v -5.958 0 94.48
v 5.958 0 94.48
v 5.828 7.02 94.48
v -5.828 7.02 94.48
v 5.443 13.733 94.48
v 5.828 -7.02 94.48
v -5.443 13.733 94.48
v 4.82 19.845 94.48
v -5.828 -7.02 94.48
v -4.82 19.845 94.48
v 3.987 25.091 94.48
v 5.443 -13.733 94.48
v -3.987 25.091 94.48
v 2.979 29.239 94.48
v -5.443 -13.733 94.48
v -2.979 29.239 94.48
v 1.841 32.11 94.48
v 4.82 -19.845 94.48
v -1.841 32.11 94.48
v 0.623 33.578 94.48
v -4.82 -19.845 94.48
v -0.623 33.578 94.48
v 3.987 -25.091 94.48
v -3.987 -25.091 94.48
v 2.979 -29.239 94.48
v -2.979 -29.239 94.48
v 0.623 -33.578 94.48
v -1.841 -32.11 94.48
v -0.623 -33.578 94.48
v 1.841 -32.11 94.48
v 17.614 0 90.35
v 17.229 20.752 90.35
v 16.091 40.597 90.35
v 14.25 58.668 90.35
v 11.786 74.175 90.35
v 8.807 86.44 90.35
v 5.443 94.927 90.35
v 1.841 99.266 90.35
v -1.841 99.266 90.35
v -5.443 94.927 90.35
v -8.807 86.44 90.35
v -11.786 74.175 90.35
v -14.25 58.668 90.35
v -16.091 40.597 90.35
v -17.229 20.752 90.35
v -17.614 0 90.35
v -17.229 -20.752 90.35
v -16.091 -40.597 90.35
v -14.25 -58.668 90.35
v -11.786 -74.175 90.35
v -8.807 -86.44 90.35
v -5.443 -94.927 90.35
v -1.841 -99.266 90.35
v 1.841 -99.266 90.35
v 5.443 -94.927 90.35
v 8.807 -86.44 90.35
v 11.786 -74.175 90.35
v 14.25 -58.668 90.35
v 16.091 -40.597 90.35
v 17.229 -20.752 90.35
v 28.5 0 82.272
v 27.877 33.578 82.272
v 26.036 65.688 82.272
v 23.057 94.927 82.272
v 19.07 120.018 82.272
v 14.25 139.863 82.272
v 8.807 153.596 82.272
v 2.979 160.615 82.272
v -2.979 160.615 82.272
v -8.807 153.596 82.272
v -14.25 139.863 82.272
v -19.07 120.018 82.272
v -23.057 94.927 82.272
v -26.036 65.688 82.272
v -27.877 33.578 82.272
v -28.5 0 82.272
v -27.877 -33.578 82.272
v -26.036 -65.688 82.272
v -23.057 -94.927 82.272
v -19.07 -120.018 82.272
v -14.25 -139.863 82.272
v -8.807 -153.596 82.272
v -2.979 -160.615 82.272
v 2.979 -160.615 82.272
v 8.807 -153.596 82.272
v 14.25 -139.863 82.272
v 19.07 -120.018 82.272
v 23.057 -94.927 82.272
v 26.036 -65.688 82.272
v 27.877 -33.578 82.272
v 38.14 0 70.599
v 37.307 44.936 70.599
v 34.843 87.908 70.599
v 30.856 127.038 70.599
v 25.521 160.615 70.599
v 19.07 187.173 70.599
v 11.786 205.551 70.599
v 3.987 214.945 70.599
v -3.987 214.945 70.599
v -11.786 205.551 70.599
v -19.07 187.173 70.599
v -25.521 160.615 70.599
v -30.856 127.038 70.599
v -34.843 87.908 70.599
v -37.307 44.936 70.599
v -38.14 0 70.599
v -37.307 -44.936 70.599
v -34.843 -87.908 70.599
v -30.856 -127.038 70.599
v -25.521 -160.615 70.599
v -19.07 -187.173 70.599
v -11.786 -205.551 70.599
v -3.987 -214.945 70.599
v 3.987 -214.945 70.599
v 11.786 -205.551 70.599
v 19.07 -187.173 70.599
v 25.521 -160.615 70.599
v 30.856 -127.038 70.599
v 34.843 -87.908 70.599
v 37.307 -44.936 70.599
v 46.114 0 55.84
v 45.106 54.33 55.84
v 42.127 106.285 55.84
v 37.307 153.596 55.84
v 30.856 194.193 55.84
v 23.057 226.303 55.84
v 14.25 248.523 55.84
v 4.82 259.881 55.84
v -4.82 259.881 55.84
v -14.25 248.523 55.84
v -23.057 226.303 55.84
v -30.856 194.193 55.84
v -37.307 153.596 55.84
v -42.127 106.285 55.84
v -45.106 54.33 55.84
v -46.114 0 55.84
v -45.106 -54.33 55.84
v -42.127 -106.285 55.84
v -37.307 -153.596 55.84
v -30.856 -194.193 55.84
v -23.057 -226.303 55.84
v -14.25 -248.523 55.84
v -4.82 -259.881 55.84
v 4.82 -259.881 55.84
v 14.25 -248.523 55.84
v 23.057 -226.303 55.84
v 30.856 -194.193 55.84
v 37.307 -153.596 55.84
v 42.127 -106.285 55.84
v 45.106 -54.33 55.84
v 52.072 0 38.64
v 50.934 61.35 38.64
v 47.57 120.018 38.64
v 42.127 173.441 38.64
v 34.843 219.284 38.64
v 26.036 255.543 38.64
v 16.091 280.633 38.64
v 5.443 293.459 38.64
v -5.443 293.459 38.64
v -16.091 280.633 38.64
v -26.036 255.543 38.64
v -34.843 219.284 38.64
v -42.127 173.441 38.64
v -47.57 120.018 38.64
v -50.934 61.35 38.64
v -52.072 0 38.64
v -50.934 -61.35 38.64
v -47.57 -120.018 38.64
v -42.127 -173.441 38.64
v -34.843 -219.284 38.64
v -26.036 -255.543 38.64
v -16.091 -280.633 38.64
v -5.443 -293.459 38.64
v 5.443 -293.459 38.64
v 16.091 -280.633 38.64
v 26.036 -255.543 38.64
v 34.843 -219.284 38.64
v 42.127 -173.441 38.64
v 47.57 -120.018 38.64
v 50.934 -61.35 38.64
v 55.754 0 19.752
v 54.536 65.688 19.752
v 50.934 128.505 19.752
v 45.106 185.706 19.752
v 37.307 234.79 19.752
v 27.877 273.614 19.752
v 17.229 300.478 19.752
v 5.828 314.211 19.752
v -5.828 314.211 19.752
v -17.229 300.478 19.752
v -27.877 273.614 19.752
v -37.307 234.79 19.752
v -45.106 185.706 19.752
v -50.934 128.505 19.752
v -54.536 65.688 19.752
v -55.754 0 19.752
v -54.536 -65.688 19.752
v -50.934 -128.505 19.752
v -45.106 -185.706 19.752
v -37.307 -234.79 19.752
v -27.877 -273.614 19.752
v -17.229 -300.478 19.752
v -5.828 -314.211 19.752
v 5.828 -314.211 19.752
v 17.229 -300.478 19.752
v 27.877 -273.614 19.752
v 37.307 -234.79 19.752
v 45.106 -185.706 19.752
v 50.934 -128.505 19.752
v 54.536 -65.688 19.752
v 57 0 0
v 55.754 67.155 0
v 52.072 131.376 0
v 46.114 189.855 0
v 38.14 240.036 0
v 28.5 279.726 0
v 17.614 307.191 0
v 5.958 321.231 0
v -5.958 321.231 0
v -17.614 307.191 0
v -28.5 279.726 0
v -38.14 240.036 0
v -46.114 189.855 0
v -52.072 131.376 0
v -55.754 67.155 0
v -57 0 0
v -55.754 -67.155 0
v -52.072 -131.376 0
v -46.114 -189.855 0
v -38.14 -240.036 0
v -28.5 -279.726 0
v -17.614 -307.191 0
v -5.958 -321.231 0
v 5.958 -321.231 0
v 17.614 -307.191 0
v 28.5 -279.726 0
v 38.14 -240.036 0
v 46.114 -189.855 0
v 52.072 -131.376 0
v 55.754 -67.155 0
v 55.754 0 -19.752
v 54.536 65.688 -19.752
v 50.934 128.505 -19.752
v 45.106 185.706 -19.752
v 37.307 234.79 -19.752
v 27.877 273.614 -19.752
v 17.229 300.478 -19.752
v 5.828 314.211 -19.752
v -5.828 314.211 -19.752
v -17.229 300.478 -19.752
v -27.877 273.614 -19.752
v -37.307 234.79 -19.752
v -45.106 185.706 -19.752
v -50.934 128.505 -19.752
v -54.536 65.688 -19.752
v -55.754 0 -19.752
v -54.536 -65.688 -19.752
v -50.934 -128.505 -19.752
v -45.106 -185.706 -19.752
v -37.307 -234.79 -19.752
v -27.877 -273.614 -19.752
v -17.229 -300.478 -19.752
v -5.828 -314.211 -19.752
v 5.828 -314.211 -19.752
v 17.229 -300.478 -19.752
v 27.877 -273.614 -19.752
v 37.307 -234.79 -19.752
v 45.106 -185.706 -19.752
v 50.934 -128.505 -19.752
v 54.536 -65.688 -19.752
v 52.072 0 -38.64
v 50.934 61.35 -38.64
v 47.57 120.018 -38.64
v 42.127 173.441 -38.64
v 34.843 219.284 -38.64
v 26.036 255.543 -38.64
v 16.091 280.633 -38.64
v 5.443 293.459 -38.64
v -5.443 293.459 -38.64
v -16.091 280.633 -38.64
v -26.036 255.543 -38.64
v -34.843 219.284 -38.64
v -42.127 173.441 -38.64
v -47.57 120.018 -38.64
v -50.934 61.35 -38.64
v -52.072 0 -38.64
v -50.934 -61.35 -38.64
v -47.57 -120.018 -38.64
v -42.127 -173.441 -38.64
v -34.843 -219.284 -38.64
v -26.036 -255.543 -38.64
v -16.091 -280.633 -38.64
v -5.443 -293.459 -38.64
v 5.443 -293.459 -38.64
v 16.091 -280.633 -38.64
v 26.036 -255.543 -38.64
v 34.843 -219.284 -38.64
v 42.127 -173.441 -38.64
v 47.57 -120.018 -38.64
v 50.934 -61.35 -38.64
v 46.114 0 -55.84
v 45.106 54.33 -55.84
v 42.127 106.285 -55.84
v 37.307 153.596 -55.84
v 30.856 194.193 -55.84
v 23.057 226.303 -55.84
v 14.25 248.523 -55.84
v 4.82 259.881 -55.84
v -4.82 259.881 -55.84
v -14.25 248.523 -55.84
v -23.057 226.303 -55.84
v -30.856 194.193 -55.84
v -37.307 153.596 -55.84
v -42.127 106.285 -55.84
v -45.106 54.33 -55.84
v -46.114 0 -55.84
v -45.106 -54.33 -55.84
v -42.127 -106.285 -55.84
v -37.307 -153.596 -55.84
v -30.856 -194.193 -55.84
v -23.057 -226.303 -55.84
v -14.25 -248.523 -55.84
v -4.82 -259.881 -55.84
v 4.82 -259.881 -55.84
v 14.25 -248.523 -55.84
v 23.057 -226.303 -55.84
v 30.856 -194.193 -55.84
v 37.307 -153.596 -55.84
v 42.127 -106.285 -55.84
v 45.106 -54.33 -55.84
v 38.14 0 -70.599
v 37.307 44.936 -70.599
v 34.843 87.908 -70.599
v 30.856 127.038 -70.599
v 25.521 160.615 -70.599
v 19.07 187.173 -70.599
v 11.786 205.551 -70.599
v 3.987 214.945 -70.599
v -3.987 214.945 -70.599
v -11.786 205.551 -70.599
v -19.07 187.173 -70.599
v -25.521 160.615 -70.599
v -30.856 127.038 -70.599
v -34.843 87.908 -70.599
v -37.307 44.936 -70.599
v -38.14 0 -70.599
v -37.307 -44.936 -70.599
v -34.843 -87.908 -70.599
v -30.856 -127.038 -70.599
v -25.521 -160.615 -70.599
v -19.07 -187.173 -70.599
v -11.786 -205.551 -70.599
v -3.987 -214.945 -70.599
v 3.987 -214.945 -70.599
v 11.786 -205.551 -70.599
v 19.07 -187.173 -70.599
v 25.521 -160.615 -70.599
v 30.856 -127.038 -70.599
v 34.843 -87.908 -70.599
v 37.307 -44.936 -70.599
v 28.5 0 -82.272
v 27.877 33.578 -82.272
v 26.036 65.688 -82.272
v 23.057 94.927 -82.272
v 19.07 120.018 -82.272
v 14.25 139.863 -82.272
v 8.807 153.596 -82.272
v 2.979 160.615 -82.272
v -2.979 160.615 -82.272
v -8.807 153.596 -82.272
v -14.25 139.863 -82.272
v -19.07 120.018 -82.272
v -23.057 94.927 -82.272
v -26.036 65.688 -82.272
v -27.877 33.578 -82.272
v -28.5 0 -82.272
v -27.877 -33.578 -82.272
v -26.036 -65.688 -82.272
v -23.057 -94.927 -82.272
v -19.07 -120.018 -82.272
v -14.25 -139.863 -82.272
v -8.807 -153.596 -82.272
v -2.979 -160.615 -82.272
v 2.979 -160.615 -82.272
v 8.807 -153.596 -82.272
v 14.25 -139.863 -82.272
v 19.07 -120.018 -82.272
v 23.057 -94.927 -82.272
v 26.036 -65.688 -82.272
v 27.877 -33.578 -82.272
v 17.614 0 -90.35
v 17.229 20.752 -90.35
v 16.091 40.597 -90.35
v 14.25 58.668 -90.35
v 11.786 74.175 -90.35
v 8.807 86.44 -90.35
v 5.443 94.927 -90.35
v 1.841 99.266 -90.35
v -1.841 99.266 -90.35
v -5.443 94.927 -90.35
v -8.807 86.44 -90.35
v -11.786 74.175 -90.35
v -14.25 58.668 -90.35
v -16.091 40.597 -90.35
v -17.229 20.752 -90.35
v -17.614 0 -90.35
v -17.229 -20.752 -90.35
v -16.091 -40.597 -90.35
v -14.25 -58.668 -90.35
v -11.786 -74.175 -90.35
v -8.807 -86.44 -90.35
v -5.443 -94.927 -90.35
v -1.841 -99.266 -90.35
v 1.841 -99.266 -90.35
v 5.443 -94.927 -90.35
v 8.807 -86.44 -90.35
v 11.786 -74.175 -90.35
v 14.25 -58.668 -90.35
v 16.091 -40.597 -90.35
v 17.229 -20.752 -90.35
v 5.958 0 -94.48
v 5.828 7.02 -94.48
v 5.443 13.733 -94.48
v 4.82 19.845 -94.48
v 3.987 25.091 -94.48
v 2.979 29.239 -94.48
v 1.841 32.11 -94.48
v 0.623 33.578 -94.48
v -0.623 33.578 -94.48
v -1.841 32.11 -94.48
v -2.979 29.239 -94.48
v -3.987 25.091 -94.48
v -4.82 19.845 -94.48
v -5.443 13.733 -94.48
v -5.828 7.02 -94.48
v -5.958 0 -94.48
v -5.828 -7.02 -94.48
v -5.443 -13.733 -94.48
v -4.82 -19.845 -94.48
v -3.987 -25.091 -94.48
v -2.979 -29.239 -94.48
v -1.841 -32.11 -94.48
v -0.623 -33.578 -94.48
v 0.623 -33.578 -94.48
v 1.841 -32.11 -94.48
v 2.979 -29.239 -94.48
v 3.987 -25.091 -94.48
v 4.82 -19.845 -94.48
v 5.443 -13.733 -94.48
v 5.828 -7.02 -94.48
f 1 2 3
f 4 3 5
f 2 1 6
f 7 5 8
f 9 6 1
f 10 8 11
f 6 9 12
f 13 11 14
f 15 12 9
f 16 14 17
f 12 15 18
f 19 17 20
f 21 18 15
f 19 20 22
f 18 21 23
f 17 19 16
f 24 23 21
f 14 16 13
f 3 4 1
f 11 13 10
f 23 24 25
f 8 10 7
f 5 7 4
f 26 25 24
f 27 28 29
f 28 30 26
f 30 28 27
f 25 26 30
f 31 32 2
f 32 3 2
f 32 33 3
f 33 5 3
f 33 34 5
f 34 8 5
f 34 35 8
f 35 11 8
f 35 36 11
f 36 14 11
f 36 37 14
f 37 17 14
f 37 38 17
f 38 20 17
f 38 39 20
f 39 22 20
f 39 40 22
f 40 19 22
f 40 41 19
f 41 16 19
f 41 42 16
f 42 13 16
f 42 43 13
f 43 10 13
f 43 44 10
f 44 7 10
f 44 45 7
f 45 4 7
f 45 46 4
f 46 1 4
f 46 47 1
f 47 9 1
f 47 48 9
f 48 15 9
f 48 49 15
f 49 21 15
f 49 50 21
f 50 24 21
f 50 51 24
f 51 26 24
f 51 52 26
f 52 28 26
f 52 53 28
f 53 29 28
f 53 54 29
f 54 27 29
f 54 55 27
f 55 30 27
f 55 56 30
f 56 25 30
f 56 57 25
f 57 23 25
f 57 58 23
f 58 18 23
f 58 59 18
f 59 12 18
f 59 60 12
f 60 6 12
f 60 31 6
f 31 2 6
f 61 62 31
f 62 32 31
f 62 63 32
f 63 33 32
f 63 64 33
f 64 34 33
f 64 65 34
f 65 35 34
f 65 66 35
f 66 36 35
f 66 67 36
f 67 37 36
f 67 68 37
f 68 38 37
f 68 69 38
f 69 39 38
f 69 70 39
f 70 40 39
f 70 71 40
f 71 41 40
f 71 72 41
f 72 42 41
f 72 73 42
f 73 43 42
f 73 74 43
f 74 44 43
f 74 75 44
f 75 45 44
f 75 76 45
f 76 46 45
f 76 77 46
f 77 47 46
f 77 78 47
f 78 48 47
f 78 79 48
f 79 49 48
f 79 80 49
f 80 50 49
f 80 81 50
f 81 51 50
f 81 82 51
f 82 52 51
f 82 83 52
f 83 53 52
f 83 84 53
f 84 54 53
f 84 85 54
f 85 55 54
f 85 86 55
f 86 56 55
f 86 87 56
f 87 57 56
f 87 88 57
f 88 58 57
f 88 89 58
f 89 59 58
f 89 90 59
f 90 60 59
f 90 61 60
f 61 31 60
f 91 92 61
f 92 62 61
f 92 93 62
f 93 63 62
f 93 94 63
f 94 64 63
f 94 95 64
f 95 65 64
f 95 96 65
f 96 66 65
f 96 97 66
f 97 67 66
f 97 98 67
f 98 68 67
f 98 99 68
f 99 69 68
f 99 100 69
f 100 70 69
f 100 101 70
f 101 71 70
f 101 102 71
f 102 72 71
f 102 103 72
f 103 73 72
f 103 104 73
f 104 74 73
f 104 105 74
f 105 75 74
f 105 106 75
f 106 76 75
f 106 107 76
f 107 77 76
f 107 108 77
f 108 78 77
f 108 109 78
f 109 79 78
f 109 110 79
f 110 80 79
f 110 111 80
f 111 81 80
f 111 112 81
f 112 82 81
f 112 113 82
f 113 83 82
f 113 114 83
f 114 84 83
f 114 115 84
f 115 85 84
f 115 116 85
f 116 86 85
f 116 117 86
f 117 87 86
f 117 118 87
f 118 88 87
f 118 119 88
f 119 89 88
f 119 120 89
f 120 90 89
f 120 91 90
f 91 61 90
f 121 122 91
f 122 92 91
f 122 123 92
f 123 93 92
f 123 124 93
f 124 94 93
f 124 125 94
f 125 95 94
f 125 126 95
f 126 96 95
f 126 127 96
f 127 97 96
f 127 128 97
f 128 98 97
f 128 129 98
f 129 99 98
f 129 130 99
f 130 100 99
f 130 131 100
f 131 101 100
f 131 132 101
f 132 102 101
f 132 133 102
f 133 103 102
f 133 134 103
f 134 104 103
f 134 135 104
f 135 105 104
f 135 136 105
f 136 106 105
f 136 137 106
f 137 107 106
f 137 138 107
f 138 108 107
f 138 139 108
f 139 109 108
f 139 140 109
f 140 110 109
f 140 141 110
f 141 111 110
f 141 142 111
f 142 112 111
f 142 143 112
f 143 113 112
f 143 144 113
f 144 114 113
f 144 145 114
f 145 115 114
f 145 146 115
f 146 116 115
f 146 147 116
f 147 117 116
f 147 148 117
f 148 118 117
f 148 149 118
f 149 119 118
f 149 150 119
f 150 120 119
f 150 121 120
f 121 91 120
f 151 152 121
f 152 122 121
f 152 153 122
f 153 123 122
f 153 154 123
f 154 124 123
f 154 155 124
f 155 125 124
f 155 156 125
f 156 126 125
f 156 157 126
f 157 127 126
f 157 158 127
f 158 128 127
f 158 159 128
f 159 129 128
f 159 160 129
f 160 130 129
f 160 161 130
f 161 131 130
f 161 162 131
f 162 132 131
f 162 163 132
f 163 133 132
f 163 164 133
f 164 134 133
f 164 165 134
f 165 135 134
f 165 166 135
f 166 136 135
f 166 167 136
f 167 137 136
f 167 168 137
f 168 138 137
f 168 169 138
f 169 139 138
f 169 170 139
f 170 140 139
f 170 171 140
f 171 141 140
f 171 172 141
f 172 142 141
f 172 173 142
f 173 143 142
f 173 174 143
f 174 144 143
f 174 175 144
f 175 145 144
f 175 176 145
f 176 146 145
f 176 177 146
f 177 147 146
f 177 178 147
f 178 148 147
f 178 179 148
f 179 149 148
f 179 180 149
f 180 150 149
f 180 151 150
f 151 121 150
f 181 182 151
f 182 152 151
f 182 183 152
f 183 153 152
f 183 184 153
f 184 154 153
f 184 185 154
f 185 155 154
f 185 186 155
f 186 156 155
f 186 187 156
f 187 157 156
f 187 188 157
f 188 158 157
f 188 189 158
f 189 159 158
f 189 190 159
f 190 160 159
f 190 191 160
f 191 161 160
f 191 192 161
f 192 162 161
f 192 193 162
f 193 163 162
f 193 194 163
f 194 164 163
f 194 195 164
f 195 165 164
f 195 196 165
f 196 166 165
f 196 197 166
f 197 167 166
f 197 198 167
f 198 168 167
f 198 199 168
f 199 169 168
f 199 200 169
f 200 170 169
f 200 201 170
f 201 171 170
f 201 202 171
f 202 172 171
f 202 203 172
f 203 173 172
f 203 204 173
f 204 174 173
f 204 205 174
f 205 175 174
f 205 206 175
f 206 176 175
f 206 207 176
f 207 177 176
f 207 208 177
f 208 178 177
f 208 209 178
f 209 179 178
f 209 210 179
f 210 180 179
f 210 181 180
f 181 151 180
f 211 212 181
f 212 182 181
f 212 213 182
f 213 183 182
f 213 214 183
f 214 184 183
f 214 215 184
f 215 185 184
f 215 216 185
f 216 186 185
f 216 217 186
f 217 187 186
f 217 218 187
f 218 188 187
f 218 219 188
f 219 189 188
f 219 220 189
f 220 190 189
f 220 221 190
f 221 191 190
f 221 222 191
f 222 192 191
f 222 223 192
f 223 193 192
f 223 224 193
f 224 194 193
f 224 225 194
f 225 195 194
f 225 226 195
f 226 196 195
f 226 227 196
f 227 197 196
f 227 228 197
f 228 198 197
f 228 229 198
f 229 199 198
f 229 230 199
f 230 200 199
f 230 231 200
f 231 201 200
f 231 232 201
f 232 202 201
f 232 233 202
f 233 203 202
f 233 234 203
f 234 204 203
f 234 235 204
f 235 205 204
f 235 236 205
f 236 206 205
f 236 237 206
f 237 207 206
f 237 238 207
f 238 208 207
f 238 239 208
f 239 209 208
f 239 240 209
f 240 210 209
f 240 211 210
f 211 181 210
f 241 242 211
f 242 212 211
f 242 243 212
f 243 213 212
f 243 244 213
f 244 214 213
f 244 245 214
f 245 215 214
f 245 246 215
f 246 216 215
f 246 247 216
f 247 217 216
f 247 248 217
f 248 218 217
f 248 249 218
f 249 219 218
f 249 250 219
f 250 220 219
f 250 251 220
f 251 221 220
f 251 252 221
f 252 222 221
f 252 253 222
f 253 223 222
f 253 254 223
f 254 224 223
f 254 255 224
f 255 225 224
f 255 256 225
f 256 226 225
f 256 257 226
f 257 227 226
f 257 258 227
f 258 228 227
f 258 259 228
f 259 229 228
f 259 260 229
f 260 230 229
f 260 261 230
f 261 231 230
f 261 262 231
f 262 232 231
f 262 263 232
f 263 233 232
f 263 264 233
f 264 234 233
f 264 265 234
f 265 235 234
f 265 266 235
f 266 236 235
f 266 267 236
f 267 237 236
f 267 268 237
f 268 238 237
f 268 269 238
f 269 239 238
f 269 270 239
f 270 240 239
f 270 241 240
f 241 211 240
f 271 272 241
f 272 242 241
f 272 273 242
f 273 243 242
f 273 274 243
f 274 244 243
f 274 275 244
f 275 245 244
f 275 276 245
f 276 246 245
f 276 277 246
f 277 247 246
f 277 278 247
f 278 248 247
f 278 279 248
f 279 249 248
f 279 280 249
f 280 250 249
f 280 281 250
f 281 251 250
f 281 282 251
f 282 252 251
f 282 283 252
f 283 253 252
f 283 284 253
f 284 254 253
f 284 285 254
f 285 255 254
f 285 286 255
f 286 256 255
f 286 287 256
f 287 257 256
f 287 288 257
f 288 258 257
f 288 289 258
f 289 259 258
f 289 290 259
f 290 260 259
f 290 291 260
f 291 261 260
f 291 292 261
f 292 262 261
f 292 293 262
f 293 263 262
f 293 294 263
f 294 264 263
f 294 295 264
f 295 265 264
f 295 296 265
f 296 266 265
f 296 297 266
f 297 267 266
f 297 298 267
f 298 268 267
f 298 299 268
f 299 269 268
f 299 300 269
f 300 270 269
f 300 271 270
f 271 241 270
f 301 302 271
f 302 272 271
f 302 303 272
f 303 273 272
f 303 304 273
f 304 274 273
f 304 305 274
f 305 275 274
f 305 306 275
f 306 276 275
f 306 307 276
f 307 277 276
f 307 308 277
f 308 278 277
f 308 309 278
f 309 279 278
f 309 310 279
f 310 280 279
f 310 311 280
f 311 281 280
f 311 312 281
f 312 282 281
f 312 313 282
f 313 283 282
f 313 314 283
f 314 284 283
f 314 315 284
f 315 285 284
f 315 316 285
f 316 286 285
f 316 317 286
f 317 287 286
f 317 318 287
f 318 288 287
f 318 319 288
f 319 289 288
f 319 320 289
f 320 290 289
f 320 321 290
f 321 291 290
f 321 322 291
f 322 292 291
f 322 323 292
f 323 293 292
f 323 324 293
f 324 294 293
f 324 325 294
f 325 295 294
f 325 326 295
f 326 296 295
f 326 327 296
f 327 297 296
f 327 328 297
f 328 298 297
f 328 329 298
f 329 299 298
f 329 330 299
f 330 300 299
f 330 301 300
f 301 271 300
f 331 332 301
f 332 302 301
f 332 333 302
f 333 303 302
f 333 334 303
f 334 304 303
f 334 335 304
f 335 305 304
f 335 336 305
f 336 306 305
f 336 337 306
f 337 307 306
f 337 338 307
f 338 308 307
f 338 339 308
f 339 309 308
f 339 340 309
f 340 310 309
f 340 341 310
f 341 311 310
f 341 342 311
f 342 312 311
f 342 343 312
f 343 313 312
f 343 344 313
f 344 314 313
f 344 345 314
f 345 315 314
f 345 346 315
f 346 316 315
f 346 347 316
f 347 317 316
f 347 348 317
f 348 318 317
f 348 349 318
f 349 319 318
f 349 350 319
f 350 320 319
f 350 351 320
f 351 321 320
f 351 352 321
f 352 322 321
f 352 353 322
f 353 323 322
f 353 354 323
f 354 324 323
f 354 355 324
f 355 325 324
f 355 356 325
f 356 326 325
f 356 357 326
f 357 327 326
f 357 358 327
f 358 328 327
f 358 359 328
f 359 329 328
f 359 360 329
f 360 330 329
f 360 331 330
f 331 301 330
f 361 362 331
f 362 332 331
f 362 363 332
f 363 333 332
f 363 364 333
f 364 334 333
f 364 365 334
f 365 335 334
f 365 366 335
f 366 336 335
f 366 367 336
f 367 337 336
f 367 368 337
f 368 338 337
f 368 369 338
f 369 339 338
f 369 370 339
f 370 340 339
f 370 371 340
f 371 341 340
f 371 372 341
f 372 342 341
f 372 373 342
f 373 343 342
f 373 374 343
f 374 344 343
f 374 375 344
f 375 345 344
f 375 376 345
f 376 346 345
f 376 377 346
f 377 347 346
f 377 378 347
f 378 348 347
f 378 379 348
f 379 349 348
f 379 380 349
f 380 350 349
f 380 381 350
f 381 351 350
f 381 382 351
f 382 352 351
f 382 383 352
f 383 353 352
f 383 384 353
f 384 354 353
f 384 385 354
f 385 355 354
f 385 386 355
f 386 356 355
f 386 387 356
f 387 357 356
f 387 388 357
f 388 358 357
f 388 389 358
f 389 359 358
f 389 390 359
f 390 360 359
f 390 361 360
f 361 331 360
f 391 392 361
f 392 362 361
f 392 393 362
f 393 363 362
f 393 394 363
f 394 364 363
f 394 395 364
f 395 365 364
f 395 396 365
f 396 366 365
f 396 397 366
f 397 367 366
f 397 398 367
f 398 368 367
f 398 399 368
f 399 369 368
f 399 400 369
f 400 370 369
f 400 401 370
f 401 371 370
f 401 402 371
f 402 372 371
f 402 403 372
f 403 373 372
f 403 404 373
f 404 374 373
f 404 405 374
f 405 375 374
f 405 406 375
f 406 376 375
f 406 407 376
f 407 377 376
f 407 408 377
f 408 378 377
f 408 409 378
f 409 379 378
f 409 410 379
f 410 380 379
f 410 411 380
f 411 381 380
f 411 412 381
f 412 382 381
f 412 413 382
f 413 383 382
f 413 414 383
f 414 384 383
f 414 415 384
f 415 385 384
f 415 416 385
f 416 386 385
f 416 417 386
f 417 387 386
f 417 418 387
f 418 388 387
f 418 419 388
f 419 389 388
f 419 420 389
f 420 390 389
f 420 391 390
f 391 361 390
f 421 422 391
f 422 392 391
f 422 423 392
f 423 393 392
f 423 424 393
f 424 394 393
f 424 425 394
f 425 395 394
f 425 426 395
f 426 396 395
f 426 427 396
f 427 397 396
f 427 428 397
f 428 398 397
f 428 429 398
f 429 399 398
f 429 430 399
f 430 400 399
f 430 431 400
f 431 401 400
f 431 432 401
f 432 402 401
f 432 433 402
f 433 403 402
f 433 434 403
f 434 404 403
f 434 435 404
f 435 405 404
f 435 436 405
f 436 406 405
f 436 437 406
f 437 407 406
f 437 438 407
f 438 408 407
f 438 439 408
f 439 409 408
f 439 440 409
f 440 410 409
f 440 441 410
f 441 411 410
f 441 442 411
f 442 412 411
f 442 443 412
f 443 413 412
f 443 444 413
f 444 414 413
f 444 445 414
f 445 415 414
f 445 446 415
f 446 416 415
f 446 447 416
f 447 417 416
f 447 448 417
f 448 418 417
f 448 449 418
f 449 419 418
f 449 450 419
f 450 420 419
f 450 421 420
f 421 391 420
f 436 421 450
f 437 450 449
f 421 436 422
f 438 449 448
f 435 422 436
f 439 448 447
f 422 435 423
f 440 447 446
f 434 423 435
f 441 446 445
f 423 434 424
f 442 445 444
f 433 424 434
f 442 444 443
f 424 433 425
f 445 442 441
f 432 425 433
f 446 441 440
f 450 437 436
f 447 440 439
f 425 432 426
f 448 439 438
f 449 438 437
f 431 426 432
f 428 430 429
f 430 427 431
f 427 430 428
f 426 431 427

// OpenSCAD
// Generated by SolidPython 1.0.1 on 2020-07-29 00:46:45


scale(v = [3, 17, 5]) {
	sphere(r = 19);
}
/***********************************************
*********      SolidPython code:      **********
************************************************
 
# import packages: SolidPython
from solid import *
from solid.utils import *
from itertools import chain, combinations, permutations


class Resize:

    def __init__(self, scad_file):
        self.scad_file = scad_file
        #self.scad_file = import_scad(scad_file)
        # cone/cylinder param:
        self.r1 = 0
        self.r2 = 0
        self.h = 0
        # rectangular prism param:
        self.w = 0
        self.l = 0
        # ellipse param:
        self.r = 0

    # import OpenScad code (file name corresponds to shape)


    # classify shape + parameters
    def assign(self, param1, param2, param3):
        if self.scad_file == 'cone.scad':
            self.r1 = param1
            self.r2 = param2
            self.h = param3
        elif self.scad_file == 'cylinder.scad':
            self.r1 = param1
            self.r2 = param2
            self.h = param3
        elif self.scad_file == 'rectangularPrism.scad':
            self.h = param1
            self.l = param2
            self.w = param3
        else:
            self.r = param1
            self.h = param2

    # resize parameters
    def iterate(self):
        x = range(3, 20, 2)
        i = 1
        if self.scad_file == 'cone.scad':
            tempList = list(permutations(x, 2))
            for temp in tempList:
                param1 = temp[0]
                param2 = temp[1]
                filepath = 'produced_scad_files/' + 'cone' + str(param1) + '_' + str(param2) + '_' + '.scad'
                scad_render_to_file(cylinder(h=param1, r1=param2, r2=0), filepath)

        elif self.scad_file == 'cylinder.scad':
            tempList = list(permutations(x, 3))
            for temp in tempList:
                param1 = temp[0]
                param2 = temp[1]
                filepath = 'produced_scad_files/' + 'cylinder' + str(param1) + '_' + str(param2) + '_' + '.scad'
                scad_render_to_file(cylinder(h=param1, r1=param2, r2=param2), filepath)

        elif self.scad_file == 'rectangularPrism.scad':
            tempList = list(permutations(x, 3))
            for temp in tempList:
                param1 = temp[0]
                param2 = temp[1]
                param3 = temp[2]
                filepath = 'produced_scad_files/' + 'rectangularPrism' + str(param1) + '_' + str(param2) + '_' + str(
                    param3) + '.scad'
                scad_render_to_file(cube(size=(param1, param2, param3)), filepath)

        elif self.scad_file == 'ellipse.scad':
            tempList = list(permutations(x, 4))
            for temp in tempList:
                param1 = temp[0]
                param2 = temp[1]
                param3 = temp[2]
                param4 = temp[3]
                filepath = 'produced_scad_files/' + 'ellipse' + str(param1) + '_' + str(param2) + '_' + str(param3) + '_' + str(param4) + '.scad'
                scad_render_to_file(scale([param1, param2, param3])(sphere(r=param4)), filepath)

    def render_to_scadfile(self):
        scad_render_to_file(scad, 'example.scad') 
 
************************************************/
